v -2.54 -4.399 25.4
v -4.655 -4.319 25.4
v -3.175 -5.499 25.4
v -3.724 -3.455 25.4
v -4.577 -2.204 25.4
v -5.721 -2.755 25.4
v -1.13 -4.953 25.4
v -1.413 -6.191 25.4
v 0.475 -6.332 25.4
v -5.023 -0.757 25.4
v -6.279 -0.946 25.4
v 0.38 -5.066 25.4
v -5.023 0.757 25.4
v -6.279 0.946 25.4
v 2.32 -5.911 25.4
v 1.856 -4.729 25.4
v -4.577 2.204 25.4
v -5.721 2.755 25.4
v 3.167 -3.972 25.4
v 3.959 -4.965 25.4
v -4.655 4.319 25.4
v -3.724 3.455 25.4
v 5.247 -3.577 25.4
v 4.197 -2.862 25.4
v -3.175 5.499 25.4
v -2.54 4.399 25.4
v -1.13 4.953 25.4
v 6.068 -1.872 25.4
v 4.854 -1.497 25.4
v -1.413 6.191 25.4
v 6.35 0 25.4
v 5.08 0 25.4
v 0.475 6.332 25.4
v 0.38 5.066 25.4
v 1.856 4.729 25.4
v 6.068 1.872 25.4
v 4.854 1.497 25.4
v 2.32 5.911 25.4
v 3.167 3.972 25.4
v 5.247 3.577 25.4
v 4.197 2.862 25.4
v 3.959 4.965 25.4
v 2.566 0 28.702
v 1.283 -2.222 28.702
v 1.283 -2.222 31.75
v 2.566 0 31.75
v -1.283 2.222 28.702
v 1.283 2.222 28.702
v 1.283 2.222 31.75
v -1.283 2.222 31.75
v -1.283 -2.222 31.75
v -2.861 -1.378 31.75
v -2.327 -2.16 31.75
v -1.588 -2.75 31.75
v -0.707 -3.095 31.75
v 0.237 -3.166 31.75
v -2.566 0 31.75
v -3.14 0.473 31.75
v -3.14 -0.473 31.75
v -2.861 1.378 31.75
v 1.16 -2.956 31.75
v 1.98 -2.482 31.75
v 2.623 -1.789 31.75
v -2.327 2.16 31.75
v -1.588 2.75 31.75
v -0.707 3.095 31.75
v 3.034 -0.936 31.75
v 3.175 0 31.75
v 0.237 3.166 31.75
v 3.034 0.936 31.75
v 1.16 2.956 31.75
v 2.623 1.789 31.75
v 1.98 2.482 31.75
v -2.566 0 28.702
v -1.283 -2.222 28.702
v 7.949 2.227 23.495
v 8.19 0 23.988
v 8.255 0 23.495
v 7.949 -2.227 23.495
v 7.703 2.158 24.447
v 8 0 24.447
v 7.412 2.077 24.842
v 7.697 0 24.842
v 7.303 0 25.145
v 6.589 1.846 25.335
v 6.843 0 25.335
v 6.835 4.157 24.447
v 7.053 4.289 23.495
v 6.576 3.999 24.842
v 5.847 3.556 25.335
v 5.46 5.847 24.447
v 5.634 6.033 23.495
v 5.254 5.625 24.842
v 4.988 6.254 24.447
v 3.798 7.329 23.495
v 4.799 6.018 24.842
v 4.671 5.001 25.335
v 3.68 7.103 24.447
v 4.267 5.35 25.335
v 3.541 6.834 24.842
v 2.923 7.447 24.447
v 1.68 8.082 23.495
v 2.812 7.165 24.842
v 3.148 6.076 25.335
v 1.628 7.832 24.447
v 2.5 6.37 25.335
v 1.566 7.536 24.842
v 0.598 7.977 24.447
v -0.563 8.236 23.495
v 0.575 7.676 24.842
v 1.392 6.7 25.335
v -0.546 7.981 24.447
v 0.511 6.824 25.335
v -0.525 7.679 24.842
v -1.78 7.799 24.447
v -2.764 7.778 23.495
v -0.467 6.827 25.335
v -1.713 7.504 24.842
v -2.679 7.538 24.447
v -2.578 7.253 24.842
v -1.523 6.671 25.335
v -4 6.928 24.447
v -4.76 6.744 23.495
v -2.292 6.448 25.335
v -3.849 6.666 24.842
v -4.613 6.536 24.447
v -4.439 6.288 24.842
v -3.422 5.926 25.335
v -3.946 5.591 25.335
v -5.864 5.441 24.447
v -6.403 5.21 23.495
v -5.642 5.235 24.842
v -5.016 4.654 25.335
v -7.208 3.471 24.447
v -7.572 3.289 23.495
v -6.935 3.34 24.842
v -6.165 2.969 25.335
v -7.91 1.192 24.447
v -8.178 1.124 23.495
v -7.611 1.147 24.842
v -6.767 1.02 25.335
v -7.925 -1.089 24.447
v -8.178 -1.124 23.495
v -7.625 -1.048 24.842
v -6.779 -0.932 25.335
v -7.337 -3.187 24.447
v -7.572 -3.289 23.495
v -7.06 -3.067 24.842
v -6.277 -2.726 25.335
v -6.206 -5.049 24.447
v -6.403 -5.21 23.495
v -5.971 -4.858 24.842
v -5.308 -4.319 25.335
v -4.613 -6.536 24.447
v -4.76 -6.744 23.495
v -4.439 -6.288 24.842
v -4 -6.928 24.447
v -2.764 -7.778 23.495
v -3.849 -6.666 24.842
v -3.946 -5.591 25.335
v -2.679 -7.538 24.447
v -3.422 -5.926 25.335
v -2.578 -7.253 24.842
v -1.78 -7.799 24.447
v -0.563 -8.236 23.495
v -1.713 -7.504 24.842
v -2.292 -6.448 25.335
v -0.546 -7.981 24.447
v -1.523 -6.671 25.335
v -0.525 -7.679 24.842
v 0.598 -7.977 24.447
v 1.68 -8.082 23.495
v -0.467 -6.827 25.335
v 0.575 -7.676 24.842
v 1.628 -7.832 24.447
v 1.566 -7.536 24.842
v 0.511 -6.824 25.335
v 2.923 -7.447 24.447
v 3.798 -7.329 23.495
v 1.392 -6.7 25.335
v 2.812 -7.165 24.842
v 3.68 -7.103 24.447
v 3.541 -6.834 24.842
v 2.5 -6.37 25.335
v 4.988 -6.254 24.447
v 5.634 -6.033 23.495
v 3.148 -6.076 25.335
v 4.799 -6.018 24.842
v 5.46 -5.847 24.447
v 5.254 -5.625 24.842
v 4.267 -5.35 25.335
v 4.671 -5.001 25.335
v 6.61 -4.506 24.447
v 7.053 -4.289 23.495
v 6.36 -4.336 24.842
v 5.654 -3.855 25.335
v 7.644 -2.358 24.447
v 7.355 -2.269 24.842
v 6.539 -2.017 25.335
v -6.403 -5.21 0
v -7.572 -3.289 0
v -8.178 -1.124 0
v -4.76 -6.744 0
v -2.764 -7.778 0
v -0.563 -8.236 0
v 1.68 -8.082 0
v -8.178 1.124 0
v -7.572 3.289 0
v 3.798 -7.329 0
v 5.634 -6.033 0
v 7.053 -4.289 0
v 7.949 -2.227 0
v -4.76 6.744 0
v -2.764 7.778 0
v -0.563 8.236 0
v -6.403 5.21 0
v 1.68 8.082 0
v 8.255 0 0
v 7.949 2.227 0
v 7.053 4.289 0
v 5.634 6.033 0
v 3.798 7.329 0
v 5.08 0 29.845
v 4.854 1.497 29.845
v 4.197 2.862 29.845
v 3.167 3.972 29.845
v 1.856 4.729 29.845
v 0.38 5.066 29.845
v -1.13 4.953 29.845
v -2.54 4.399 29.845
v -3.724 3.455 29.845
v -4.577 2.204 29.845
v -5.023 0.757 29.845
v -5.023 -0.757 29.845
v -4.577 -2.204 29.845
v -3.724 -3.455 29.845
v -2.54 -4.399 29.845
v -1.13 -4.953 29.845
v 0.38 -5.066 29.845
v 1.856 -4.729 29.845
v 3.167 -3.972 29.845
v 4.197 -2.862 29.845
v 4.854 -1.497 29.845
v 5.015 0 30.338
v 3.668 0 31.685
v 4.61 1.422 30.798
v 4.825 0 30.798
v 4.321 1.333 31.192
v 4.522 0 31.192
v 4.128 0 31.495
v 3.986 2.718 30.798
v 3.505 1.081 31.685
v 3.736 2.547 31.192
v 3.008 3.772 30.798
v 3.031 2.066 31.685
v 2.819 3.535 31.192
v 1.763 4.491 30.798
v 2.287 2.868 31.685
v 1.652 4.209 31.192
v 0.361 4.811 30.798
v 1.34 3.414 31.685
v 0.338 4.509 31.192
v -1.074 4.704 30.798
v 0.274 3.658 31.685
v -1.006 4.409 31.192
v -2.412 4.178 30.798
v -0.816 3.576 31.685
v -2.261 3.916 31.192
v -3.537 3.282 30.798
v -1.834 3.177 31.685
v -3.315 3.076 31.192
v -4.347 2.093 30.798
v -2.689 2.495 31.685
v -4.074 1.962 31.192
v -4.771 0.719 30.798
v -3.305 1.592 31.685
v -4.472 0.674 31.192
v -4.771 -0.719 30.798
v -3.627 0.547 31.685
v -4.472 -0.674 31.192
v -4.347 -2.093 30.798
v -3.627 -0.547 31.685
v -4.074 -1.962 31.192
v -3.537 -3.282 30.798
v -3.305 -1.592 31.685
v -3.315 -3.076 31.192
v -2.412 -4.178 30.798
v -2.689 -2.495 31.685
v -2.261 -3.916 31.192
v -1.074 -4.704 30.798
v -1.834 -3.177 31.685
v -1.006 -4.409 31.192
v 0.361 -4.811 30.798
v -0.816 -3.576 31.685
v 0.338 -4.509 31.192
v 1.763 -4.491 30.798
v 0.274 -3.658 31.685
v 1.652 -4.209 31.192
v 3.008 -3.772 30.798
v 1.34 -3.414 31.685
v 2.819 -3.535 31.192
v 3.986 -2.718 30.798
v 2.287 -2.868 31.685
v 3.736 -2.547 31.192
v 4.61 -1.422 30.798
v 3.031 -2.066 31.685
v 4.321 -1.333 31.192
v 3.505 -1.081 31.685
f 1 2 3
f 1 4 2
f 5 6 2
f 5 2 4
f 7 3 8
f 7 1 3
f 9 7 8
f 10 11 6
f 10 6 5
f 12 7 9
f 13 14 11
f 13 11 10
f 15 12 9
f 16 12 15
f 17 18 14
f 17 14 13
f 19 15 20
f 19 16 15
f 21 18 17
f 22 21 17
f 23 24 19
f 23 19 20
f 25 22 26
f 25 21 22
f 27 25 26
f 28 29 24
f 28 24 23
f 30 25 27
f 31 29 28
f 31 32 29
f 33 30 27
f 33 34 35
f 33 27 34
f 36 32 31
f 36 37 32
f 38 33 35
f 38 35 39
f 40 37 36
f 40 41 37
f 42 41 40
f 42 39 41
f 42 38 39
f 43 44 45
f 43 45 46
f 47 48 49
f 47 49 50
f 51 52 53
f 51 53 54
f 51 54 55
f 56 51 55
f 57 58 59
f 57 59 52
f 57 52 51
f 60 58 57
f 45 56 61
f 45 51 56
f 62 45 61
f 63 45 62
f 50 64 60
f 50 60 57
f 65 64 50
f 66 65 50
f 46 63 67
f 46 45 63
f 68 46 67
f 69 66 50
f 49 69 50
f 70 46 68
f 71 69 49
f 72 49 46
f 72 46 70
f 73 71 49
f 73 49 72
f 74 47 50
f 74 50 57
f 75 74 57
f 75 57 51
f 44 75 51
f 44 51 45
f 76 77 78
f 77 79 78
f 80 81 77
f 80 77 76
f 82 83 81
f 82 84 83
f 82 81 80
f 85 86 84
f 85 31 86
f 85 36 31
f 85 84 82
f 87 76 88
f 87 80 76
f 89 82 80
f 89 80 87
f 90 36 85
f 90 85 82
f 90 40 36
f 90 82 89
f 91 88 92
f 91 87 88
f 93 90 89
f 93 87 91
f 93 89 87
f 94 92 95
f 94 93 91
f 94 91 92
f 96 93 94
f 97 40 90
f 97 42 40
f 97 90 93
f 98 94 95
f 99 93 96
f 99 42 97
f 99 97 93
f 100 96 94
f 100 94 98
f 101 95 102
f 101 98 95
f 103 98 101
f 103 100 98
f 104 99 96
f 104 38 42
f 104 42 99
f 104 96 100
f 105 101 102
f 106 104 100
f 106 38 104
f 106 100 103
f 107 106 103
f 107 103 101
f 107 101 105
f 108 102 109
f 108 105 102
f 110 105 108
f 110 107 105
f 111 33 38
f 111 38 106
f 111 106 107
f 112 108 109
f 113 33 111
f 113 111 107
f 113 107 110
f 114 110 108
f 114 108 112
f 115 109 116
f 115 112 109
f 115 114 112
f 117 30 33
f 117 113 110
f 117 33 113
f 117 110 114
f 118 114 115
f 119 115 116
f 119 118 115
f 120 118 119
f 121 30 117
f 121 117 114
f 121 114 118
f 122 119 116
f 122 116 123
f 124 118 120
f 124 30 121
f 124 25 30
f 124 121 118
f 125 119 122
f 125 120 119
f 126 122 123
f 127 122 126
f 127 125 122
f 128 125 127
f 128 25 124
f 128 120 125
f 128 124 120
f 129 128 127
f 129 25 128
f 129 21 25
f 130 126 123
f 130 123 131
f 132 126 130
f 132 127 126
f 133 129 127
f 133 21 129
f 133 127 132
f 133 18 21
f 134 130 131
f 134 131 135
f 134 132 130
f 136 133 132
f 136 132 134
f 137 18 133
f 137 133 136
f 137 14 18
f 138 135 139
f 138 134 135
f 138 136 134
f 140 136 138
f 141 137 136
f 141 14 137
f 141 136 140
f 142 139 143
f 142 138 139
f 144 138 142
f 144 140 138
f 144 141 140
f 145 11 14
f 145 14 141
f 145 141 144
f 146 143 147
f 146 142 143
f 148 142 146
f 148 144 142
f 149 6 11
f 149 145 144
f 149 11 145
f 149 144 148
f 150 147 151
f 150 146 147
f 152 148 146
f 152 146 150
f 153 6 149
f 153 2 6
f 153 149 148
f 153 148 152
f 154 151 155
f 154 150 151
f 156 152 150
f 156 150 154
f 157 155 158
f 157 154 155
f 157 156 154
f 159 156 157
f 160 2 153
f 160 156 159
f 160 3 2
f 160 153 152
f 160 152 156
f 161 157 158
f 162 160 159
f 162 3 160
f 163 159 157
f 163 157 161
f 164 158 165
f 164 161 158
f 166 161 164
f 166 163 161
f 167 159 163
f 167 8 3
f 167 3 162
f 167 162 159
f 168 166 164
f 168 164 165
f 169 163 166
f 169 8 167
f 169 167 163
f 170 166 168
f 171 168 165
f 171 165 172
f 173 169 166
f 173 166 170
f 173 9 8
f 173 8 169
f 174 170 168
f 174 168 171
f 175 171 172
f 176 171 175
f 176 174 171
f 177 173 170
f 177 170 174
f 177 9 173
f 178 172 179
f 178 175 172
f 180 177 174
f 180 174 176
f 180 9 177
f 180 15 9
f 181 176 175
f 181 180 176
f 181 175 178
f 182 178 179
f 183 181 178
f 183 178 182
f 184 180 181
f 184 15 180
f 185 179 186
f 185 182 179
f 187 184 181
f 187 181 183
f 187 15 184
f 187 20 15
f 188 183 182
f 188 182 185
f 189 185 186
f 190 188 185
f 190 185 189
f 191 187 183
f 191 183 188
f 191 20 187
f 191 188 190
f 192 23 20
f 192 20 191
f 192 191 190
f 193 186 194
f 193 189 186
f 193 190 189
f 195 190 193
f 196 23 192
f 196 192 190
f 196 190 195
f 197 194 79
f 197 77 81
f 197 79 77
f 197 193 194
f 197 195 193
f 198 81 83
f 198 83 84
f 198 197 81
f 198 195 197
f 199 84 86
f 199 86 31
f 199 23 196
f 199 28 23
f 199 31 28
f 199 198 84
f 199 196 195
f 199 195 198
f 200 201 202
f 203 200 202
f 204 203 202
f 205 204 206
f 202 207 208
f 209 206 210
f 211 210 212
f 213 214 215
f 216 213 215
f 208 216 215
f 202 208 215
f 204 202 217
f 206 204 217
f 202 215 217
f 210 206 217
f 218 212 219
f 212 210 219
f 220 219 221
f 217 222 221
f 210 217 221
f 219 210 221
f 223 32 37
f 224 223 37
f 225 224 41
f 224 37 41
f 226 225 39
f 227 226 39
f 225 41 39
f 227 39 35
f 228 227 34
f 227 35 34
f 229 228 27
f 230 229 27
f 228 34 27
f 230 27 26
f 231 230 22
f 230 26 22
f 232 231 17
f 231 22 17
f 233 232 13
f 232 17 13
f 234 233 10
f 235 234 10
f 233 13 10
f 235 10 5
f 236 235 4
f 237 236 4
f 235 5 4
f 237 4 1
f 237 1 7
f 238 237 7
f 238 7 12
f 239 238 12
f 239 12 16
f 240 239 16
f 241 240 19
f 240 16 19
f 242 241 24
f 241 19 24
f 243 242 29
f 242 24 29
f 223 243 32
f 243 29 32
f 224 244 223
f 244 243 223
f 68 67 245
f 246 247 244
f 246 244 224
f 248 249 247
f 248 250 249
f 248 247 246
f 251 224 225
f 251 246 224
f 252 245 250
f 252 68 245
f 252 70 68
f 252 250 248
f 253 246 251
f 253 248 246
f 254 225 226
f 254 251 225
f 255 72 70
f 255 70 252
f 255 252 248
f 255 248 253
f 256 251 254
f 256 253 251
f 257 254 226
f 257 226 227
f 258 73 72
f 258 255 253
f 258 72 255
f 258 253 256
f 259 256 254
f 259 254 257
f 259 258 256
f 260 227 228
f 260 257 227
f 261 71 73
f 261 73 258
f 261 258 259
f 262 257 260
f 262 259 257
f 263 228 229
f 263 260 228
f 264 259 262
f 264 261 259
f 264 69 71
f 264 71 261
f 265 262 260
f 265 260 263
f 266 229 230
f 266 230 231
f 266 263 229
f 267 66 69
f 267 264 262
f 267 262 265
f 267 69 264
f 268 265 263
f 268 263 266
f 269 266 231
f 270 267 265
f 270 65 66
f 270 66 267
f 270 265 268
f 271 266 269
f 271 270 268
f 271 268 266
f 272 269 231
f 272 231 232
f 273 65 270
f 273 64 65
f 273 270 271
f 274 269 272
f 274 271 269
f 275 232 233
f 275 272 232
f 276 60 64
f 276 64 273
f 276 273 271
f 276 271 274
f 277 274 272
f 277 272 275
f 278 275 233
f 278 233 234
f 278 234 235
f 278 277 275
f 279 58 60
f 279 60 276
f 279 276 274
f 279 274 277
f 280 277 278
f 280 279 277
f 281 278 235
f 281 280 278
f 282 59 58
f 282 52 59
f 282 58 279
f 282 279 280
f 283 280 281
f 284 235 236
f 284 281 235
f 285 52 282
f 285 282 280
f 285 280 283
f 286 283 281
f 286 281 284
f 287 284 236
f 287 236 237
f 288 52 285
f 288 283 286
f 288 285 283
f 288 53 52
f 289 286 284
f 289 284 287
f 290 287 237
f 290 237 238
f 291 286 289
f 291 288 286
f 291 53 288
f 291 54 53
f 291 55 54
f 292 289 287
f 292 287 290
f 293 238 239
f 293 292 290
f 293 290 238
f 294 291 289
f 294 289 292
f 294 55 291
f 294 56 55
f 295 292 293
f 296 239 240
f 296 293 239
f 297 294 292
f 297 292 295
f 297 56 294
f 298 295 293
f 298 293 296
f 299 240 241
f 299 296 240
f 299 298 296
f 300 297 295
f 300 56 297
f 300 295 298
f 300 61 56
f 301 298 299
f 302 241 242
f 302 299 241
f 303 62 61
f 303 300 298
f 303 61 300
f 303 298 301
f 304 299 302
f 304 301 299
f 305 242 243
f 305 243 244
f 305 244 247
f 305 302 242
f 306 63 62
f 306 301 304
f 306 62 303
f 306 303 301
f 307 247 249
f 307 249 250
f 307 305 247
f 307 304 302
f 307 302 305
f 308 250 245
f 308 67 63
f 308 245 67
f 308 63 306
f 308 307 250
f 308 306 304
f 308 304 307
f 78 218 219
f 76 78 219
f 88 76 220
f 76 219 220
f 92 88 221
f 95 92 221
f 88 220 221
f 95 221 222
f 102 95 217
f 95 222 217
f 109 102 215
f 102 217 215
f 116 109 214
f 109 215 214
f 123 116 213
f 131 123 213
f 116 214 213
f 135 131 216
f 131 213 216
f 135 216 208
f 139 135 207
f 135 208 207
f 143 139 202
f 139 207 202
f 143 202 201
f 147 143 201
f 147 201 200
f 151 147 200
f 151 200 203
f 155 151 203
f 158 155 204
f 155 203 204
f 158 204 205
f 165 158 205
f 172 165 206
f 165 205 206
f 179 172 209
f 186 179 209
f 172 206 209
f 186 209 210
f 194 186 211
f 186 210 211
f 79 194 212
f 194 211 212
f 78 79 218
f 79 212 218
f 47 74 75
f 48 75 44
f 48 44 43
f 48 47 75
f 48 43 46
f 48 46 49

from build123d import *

# Parameters (mm, degrees)
F0_R     = 8.255
F1_DEPTH = 25.4
F2_R     = 5.08
F3_DEPTH = 6.35
F5_DEPTH = 3.048
F6_R     = 1.905


with BuildPart() as f1:
    # F0 (on Top) → F1 (new body)
    with BuildSketch(Plane.XY):
        Circle(F0_R)
    extrude(amount=F1_DEPTH)

    # F2 (on face) → F3 (join)
    with BuildSketch(Plane.XY.offset(25.4)):
        Circle(F2_R)
    extrude(amount=F3_DEPTH)

    # F4 (on face) → F5 (cut)
    with BuildSketch(Plane.XY.offset(31.75)):
        Polygon((1.283161, 2.2225), (-1.283161, 2.2225), (-2.566322, 0), (-1.283161, -2.2225), (1.283161, -2.2225), (2.566322, 0), align=None)
    extrude(amount=-F5_DEPTH, mode=Mode.SUBTRACT)

    # F6
    f6_edges = [f1.edges().sort_by_distance(p)[0] for p in [
        (-8.255, 0, 25.4),
        (-5.08, 0, 31.75),
    ]]
    fillet(f6_edges, radius=F6_R)


solid = f1.part
